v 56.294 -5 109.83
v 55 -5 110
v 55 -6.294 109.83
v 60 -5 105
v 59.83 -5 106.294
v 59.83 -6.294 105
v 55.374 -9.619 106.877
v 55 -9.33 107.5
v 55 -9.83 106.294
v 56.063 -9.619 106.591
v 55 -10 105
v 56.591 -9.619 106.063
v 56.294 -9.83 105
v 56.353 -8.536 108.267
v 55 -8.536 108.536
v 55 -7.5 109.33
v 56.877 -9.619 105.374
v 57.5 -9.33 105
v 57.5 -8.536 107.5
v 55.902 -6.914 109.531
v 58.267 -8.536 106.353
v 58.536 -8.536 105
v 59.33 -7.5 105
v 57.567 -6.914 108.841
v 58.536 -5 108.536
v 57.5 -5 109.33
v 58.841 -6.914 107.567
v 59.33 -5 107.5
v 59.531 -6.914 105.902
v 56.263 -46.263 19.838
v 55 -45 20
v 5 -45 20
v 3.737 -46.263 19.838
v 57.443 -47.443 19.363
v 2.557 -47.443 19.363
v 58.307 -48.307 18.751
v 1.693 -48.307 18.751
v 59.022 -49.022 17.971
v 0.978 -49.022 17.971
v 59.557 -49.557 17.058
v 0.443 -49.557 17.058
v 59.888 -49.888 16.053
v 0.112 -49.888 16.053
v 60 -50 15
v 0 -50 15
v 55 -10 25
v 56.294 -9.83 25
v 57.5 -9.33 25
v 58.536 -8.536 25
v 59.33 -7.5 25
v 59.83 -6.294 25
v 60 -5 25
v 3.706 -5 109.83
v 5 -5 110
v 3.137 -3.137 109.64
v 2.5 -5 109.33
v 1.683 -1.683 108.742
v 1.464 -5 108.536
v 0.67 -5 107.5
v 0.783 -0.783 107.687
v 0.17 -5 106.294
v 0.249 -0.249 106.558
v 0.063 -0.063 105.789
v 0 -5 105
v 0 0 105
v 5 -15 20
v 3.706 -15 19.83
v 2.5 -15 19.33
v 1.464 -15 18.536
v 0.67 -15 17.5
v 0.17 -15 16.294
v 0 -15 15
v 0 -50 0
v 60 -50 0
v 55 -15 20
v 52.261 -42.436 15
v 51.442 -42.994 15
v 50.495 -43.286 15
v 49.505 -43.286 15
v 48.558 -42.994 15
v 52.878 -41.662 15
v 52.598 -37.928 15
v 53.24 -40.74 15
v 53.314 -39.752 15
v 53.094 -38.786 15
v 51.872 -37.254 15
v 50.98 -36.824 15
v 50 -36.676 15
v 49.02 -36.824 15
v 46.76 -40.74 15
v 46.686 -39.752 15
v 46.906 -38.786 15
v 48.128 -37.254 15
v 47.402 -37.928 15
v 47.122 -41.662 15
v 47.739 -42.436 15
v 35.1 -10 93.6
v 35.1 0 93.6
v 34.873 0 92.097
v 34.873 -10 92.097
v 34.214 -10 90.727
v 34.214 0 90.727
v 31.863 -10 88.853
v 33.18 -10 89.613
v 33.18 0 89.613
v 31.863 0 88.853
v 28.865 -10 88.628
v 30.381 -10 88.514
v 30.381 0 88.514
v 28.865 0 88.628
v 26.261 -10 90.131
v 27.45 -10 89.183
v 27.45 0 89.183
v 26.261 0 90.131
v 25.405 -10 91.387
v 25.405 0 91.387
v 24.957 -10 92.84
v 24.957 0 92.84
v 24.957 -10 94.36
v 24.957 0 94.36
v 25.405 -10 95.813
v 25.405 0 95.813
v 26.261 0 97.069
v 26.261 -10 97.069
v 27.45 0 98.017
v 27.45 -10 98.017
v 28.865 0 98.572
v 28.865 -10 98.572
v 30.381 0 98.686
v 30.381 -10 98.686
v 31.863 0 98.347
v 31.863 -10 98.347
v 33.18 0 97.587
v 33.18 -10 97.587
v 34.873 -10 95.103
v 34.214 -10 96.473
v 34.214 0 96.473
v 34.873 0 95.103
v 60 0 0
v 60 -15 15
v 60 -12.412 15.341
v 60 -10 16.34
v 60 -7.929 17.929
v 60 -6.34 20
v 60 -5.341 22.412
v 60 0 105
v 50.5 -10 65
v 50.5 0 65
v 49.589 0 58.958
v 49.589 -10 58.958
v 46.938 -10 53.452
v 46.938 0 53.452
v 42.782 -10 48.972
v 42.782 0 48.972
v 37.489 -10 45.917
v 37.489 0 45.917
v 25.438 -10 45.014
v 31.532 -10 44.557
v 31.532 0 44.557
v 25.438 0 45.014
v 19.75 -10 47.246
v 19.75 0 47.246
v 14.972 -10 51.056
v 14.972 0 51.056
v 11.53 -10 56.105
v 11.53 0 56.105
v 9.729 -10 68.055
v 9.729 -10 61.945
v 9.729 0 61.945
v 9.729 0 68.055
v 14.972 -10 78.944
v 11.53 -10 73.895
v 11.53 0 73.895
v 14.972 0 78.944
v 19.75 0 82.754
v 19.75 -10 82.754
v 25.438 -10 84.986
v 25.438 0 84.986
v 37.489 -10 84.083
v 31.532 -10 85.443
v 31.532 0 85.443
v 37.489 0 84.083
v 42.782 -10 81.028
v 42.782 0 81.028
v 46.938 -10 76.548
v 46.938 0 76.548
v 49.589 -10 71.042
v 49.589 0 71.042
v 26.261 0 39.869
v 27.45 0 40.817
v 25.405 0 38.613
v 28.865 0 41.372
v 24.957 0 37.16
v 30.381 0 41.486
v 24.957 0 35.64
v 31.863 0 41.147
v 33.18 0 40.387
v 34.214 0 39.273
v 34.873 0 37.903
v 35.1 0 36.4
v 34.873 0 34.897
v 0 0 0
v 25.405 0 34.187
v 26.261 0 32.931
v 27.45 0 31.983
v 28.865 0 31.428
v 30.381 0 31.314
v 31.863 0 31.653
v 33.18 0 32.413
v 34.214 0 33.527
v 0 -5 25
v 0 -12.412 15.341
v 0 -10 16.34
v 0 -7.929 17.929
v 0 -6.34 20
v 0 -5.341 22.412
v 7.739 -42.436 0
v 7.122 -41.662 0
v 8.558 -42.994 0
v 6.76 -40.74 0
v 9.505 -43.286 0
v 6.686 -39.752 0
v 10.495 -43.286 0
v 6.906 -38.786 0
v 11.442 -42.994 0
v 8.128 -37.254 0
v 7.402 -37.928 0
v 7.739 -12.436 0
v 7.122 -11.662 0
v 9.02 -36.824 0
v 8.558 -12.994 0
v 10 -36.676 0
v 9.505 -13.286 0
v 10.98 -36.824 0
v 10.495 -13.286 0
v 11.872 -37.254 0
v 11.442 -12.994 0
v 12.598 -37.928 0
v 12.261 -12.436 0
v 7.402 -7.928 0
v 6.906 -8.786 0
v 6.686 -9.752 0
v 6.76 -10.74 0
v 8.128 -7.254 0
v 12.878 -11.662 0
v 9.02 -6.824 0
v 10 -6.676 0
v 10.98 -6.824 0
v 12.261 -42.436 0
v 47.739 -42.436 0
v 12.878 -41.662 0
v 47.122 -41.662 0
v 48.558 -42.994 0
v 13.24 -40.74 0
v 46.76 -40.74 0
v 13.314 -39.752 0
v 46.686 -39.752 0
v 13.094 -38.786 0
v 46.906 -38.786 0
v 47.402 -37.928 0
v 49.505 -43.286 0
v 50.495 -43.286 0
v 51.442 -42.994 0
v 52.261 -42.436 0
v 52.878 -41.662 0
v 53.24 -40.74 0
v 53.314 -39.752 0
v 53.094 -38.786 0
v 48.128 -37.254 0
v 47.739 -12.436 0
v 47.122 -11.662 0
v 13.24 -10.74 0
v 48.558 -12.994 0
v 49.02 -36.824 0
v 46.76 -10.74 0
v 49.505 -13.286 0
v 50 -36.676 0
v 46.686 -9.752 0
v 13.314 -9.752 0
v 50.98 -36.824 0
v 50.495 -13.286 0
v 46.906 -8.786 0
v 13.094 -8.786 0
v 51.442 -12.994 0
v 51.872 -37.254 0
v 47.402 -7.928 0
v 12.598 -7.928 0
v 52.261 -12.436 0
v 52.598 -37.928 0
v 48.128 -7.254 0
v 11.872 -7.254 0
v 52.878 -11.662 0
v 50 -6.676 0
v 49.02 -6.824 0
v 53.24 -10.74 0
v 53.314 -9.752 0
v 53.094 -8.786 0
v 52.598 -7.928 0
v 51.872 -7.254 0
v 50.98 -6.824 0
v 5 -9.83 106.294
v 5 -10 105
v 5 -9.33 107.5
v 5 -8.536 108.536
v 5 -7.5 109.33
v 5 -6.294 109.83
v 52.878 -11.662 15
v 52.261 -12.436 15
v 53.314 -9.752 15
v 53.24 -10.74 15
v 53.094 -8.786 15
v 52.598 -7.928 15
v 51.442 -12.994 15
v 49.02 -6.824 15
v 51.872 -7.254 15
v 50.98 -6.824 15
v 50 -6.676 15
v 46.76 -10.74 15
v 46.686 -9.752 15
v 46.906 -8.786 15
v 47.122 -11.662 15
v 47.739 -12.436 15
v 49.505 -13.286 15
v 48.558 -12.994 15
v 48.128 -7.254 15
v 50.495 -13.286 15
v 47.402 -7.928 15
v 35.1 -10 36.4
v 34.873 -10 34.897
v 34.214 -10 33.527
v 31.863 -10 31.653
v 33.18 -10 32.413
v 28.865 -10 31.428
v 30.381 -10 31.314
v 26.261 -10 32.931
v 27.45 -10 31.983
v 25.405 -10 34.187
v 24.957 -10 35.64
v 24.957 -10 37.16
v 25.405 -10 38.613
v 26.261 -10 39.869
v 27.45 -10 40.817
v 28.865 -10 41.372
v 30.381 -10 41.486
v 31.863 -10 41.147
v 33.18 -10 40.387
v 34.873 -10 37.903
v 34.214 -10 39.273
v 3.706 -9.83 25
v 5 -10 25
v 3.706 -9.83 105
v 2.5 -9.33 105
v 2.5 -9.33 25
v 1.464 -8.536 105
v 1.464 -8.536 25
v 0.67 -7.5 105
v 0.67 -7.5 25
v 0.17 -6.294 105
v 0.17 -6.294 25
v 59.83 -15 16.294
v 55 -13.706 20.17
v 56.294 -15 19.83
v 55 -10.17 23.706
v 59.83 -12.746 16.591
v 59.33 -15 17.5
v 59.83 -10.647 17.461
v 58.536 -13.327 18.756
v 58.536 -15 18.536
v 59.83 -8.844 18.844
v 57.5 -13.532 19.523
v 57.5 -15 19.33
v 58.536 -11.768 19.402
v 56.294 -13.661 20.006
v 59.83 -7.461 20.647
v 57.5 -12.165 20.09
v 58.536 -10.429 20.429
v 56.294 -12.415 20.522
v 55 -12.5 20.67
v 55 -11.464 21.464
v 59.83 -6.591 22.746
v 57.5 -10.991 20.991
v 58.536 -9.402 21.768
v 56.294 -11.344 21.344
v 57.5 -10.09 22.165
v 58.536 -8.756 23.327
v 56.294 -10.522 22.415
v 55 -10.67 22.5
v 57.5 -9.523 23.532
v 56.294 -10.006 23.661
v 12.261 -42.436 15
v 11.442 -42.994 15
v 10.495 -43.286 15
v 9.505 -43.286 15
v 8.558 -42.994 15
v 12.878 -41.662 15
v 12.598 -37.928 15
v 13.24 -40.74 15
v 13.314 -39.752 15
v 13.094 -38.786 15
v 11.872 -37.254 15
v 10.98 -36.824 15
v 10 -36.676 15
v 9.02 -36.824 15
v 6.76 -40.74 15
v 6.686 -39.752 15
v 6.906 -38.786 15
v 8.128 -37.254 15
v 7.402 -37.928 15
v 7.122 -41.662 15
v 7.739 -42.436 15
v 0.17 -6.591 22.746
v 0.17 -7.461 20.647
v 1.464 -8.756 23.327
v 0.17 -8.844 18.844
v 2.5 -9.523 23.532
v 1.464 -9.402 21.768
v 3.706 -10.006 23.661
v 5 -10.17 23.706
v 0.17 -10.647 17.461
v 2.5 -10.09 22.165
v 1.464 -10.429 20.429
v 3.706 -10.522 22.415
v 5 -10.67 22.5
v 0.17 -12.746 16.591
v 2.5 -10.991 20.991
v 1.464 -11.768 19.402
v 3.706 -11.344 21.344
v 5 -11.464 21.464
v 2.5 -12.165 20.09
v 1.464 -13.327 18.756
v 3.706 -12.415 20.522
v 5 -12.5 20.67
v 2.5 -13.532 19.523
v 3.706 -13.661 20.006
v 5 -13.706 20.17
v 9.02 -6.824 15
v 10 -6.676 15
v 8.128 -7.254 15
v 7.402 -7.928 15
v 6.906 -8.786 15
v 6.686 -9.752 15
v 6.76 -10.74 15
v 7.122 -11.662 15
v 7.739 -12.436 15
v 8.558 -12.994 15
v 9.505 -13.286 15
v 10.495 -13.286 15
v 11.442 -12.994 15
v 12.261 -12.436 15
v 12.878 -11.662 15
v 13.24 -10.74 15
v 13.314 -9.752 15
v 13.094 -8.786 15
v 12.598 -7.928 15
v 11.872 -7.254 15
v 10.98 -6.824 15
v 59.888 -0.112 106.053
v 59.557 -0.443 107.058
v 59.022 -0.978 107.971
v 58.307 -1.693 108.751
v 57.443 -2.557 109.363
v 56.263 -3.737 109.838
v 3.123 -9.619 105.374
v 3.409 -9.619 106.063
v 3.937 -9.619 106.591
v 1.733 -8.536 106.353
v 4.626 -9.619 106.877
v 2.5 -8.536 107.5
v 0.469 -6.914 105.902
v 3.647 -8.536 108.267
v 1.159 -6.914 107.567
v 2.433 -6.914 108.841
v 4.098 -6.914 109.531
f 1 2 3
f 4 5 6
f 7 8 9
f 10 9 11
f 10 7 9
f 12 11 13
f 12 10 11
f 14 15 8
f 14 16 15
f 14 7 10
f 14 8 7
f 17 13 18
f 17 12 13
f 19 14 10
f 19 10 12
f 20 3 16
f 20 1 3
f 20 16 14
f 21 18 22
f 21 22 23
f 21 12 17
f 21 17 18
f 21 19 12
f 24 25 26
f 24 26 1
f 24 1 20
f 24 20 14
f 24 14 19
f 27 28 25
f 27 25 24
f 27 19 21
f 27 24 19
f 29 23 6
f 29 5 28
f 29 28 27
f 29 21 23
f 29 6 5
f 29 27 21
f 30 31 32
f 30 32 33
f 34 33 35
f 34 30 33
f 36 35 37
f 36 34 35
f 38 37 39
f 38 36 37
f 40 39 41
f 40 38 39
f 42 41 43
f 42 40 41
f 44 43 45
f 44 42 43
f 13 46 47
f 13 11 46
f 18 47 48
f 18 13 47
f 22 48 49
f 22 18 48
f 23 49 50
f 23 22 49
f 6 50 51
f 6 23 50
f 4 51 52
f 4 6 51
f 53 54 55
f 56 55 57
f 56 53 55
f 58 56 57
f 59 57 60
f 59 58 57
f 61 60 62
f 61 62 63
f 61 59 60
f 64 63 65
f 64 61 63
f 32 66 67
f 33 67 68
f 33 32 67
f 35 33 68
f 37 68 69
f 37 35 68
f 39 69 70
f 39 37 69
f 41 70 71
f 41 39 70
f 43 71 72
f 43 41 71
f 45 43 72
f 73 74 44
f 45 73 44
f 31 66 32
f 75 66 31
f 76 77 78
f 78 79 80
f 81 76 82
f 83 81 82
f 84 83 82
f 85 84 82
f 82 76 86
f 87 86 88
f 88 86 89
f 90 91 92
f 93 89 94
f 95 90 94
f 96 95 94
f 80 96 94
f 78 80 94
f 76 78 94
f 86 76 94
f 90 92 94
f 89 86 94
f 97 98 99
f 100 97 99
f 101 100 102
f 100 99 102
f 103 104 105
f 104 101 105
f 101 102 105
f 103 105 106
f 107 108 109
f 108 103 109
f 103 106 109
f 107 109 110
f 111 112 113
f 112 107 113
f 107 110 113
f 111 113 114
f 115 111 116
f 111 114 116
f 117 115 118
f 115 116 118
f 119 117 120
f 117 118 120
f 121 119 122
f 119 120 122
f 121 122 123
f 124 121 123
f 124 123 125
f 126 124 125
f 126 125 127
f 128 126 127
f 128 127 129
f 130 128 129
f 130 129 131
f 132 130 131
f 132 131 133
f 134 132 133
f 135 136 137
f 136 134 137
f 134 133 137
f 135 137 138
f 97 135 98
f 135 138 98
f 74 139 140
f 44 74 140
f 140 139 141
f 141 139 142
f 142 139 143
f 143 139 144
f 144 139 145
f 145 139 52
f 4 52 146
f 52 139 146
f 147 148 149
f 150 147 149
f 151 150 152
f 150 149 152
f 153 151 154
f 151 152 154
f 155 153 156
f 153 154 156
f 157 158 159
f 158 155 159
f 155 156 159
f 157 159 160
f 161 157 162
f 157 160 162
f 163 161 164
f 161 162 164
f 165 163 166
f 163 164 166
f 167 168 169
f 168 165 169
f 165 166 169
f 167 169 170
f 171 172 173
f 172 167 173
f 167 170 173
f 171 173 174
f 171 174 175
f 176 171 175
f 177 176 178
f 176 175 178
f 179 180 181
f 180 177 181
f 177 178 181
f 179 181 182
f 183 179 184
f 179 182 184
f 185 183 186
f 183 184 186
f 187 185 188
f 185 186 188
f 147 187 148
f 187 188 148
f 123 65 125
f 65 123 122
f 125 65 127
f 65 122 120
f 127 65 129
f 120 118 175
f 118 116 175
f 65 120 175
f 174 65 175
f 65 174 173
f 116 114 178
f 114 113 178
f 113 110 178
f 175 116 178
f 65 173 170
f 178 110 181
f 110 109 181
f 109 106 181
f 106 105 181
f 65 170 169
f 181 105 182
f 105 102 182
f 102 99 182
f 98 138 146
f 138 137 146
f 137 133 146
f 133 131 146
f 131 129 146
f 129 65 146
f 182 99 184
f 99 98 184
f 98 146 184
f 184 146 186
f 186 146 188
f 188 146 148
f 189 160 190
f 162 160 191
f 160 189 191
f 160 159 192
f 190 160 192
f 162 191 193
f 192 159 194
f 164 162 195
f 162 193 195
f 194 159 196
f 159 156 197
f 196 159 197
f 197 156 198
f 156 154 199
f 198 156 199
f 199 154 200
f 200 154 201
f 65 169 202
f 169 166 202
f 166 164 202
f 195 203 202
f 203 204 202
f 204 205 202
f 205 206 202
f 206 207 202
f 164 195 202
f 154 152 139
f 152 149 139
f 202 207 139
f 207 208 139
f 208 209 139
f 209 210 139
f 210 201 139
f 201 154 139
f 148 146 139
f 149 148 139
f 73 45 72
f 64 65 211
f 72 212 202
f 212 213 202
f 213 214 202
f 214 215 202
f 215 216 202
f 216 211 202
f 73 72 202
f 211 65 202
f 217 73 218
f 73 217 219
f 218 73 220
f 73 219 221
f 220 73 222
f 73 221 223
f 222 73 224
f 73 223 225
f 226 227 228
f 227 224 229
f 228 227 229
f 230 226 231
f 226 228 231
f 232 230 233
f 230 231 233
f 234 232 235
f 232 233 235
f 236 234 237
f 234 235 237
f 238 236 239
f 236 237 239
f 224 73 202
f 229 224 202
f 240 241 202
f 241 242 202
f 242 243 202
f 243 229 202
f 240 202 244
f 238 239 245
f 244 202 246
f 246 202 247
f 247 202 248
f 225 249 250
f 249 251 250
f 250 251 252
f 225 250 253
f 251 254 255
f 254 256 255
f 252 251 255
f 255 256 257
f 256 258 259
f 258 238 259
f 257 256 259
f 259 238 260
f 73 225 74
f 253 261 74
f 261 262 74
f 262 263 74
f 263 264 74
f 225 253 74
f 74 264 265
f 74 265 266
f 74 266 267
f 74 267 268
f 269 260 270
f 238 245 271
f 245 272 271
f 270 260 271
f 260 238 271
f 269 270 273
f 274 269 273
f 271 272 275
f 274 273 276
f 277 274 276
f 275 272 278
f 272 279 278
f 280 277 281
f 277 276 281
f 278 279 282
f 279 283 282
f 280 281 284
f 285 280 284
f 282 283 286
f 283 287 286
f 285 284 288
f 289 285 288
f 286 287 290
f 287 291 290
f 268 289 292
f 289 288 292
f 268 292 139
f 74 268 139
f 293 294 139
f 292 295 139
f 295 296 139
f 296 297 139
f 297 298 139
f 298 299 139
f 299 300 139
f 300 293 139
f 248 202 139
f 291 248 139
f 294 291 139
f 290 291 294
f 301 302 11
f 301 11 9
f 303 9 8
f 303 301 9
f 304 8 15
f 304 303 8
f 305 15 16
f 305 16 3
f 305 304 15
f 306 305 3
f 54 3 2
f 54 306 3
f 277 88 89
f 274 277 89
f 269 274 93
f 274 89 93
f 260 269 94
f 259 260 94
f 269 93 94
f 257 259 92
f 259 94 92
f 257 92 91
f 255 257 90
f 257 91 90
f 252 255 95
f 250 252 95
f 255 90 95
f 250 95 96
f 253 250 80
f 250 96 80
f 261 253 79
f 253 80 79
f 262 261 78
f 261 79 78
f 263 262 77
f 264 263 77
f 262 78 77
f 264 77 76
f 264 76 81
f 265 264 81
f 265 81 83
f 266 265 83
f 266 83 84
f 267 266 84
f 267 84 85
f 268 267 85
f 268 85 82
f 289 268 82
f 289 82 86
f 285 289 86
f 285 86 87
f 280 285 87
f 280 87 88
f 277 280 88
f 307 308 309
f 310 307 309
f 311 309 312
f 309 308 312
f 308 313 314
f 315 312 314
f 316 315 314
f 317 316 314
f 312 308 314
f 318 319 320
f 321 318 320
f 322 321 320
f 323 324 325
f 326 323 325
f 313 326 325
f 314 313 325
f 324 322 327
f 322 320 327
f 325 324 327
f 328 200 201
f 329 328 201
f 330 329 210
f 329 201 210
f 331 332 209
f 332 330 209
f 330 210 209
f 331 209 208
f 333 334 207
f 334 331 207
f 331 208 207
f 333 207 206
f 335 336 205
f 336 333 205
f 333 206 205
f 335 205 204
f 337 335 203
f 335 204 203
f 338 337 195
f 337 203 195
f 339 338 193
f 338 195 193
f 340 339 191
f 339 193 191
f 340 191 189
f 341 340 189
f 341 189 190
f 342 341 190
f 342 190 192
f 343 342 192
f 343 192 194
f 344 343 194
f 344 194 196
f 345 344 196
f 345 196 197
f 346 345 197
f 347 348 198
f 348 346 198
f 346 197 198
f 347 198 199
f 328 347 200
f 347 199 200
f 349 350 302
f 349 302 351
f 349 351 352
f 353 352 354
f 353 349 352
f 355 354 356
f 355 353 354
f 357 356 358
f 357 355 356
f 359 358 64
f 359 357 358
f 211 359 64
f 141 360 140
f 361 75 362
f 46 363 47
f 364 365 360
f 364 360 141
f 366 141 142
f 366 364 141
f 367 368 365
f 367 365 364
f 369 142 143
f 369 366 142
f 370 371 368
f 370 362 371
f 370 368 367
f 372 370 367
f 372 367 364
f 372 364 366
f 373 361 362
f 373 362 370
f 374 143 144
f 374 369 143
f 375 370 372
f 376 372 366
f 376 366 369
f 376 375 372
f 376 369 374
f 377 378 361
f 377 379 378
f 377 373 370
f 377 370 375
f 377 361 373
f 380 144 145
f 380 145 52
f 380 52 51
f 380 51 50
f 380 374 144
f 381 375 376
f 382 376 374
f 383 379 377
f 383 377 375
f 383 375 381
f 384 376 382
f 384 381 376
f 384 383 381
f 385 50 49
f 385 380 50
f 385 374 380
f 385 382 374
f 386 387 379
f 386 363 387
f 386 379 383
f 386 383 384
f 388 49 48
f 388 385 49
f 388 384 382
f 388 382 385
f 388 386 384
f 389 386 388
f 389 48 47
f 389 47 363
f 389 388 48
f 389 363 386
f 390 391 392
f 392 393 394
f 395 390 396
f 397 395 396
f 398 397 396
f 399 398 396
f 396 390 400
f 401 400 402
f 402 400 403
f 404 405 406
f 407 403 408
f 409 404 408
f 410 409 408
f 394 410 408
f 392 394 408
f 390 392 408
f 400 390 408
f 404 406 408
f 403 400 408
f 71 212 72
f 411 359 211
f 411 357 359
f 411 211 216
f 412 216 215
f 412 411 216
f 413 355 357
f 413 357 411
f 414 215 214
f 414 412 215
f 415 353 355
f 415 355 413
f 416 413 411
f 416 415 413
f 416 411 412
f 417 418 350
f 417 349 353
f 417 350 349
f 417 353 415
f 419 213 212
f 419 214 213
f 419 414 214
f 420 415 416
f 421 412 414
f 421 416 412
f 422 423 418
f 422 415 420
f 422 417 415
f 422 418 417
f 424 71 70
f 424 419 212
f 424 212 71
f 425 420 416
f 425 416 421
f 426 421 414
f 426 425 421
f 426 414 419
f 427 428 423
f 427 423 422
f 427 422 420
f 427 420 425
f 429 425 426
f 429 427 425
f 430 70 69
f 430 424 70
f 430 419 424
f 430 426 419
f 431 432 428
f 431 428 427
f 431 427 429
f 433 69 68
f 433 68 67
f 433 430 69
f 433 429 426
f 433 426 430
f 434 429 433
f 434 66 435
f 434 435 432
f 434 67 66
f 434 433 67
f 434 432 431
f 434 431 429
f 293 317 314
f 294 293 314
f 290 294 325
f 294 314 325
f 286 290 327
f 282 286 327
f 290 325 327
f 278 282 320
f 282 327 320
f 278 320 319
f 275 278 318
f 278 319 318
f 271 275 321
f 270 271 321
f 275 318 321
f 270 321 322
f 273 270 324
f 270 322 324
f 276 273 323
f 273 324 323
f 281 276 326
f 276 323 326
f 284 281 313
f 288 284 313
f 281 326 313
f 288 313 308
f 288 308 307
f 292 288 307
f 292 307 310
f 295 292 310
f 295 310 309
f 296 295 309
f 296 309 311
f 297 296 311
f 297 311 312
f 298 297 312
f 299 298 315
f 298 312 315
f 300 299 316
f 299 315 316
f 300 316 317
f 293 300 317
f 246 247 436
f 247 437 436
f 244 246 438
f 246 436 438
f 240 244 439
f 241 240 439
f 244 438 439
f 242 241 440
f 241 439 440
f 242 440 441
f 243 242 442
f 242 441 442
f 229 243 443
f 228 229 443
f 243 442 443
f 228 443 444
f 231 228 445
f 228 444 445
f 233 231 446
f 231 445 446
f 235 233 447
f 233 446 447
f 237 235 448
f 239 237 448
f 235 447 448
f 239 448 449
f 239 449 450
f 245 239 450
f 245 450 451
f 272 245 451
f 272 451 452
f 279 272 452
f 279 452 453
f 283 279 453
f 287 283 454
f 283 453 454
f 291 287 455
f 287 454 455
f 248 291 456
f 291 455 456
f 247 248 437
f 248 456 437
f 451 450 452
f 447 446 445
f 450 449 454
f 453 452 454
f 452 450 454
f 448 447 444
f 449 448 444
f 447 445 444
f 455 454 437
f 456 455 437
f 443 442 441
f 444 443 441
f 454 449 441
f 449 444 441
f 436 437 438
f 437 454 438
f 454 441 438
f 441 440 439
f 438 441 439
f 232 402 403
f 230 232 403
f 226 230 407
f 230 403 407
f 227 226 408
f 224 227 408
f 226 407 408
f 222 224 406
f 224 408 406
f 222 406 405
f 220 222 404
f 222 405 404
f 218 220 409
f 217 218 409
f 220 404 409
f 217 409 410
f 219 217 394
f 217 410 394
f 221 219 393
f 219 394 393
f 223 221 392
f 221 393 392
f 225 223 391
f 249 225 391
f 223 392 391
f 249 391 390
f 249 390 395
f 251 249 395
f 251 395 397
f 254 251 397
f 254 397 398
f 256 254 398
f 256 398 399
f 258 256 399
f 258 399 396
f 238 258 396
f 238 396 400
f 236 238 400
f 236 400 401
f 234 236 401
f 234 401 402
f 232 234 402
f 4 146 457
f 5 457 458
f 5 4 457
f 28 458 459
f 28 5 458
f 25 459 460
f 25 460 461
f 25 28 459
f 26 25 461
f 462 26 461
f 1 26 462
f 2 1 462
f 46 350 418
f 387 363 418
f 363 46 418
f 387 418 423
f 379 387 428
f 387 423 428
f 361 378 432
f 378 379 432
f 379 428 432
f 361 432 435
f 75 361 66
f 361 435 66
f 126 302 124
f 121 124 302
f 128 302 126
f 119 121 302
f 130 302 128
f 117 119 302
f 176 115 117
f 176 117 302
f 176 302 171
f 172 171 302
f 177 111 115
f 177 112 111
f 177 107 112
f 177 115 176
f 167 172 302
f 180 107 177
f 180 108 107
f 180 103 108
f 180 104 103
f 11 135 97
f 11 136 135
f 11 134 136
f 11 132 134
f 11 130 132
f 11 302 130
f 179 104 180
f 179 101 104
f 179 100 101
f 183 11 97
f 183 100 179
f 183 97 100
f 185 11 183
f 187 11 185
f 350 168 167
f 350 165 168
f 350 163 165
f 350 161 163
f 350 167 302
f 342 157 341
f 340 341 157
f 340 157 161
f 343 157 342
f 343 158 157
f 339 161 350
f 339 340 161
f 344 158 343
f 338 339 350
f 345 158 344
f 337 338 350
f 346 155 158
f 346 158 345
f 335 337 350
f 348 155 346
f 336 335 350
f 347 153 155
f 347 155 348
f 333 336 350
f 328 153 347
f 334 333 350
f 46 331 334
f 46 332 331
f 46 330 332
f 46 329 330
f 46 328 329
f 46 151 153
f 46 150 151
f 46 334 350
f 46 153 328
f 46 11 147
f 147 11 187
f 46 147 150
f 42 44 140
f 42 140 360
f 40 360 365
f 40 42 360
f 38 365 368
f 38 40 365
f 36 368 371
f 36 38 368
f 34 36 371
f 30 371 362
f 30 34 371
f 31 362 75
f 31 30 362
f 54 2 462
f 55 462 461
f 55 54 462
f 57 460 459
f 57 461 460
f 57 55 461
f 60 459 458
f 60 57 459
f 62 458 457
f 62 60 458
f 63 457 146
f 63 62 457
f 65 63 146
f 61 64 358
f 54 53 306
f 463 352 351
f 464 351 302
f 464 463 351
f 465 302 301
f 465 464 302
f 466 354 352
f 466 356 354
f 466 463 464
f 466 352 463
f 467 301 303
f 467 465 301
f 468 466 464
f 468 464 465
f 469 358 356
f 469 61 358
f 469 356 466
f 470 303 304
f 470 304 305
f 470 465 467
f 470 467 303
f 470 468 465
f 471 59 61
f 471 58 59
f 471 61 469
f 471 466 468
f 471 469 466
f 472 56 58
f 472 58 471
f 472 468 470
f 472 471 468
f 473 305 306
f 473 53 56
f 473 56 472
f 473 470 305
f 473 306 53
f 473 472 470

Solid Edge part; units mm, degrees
sketch "Sketch1" plane through (0, 0, 0) normal (0, -1, 0) x (1, 0, 0)
  line L0 (60, 0) -> (60, 110)
  line L1 (60, 110) -> (0, 110)
  line L2 (0, 110) -> (0, 0)
  line L3 (0, 0) -> (60, 0)
  circle A0 centre (30, 93.6) radius 5.1
  circle A1 centre (30, 36.4) radius 5.1
  circle A2 centre (30, 65) radius 20.5
  dimension "D1" = 41
  dimension "D2" = 16.4
  dimension "D3" = 28.6
  dimension "D4" = 28.6
  dimension "D5" = 60
  dimension "D6" = 110
extrude "Protrusion1" add sketch "Sketch1" along normal blind 10
sketch "Sketch2" plane through (0, 0, 0) normal (0, -1, 0) x (1, 0, 0)
  line L0 (0, 20) -> (60, 20)
  line L1 (60, 20) -> (60, 0)
  line L2 (60, 0) -> (0, 0)
  line L3 (0, 0) -> (0, 20)
extrude "övre_fäste_protrusion" add sketch "Sketch2" along normal blind 50
hole "Hole_5" at (10, -40, 0) direction (0, 0, 1) diameter 6.647 depth 15
hole "Hole1" at (50, -40, 0) direction (0, 0, 1) diameter 6.647 depth 15
hole "Hole2" at (10, -10, 0) direction (0, 0, 1) diameter 6.647 depth 15
hole "Hole3" at (50, -10, 0) direction (0, 0, 1) diameter 6.647 depth 15
fillet "Round_1" radius 5 10 edges at (0, -5, 110) (60, -5, 110) (30, -10, 20) (30, -50, 20) (0, -30, 20) (60, -30, 20) (60, -10, 65) (0, -10, 65) (30, -10, 110) (30, 0, 110)
